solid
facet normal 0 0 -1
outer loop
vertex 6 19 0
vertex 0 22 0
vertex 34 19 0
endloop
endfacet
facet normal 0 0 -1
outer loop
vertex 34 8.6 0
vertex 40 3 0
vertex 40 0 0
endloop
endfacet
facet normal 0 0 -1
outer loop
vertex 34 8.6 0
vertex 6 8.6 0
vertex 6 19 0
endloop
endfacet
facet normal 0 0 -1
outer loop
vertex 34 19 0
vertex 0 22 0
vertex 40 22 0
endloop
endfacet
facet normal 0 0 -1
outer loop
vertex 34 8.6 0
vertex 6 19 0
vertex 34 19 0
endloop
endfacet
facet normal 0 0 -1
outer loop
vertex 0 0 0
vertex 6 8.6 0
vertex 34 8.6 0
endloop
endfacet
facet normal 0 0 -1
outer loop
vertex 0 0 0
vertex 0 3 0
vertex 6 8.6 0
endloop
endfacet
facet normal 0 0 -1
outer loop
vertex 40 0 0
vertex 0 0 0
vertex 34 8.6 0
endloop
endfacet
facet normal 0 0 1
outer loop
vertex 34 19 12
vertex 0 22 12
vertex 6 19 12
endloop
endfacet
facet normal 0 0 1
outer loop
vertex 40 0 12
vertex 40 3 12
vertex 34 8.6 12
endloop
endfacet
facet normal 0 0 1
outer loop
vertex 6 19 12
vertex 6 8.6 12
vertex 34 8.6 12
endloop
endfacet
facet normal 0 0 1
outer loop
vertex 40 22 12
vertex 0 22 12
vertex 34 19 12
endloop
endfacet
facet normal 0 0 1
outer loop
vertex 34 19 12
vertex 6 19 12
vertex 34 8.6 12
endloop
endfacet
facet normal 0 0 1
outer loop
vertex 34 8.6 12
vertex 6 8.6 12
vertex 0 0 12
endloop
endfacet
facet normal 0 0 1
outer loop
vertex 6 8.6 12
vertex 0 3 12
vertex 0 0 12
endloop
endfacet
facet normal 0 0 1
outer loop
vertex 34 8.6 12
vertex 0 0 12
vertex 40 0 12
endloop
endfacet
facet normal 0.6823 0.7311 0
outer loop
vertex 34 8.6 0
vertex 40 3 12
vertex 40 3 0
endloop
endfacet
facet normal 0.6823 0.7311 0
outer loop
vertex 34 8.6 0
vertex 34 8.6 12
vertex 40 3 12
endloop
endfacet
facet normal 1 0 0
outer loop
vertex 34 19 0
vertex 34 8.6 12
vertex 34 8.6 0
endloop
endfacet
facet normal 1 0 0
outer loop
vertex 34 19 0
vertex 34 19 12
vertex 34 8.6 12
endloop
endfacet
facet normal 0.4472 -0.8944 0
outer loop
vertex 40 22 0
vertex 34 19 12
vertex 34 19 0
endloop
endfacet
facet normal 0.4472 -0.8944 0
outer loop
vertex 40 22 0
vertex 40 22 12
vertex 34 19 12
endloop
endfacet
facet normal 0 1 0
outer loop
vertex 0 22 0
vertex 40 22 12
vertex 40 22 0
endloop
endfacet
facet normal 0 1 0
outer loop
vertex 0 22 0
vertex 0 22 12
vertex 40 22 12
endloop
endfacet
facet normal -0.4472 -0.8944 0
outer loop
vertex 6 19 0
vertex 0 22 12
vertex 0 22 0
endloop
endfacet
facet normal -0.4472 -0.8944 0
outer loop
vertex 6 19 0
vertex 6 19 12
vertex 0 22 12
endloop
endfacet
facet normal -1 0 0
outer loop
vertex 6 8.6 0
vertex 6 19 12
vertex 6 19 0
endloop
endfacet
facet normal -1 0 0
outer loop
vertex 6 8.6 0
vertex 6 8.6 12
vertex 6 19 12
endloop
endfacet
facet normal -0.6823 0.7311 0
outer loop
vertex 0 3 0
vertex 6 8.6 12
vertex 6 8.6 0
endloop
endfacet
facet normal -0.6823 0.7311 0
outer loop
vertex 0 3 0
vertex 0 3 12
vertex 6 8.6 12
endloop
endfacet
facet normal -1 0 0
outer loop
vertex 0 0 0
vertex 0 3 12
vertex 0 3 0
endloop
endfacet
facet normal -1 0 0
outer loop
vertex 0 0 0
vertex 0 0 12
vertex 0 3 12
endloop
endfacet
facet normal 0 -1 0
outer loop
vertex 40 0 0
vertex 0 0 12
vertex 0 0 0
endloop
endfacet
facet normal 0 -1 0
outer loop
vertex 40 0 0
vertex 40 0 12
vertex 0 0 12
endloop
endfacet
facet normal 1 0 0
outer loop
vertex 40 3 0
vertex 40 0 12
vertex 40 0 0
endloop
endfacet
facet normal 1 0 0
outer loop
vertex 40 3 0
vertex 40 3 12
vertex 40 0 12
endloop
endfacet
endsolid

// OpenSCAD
$fn = 32;

// ----------------------------------------------------------------------
// Key bar: dovetail key, 12 mm thick
// ----------------------------------------------------------------------

// --- parameters (mm) ---
profile_height = 12;      // extrusion height
profile_points = 10;      // points of the closed outline

profile = [[0, 0], [40, 0], [40, 3], [34, 8.6], [34, 19], [40, 22], [0, 22], [6, 19], [6, 8.6], [0, 3]];  // single closed polygon, 10 points, counter clockwise

// --- the one profile operation ---
linear_extrude(height = profile_height) polygon(points = profile);
